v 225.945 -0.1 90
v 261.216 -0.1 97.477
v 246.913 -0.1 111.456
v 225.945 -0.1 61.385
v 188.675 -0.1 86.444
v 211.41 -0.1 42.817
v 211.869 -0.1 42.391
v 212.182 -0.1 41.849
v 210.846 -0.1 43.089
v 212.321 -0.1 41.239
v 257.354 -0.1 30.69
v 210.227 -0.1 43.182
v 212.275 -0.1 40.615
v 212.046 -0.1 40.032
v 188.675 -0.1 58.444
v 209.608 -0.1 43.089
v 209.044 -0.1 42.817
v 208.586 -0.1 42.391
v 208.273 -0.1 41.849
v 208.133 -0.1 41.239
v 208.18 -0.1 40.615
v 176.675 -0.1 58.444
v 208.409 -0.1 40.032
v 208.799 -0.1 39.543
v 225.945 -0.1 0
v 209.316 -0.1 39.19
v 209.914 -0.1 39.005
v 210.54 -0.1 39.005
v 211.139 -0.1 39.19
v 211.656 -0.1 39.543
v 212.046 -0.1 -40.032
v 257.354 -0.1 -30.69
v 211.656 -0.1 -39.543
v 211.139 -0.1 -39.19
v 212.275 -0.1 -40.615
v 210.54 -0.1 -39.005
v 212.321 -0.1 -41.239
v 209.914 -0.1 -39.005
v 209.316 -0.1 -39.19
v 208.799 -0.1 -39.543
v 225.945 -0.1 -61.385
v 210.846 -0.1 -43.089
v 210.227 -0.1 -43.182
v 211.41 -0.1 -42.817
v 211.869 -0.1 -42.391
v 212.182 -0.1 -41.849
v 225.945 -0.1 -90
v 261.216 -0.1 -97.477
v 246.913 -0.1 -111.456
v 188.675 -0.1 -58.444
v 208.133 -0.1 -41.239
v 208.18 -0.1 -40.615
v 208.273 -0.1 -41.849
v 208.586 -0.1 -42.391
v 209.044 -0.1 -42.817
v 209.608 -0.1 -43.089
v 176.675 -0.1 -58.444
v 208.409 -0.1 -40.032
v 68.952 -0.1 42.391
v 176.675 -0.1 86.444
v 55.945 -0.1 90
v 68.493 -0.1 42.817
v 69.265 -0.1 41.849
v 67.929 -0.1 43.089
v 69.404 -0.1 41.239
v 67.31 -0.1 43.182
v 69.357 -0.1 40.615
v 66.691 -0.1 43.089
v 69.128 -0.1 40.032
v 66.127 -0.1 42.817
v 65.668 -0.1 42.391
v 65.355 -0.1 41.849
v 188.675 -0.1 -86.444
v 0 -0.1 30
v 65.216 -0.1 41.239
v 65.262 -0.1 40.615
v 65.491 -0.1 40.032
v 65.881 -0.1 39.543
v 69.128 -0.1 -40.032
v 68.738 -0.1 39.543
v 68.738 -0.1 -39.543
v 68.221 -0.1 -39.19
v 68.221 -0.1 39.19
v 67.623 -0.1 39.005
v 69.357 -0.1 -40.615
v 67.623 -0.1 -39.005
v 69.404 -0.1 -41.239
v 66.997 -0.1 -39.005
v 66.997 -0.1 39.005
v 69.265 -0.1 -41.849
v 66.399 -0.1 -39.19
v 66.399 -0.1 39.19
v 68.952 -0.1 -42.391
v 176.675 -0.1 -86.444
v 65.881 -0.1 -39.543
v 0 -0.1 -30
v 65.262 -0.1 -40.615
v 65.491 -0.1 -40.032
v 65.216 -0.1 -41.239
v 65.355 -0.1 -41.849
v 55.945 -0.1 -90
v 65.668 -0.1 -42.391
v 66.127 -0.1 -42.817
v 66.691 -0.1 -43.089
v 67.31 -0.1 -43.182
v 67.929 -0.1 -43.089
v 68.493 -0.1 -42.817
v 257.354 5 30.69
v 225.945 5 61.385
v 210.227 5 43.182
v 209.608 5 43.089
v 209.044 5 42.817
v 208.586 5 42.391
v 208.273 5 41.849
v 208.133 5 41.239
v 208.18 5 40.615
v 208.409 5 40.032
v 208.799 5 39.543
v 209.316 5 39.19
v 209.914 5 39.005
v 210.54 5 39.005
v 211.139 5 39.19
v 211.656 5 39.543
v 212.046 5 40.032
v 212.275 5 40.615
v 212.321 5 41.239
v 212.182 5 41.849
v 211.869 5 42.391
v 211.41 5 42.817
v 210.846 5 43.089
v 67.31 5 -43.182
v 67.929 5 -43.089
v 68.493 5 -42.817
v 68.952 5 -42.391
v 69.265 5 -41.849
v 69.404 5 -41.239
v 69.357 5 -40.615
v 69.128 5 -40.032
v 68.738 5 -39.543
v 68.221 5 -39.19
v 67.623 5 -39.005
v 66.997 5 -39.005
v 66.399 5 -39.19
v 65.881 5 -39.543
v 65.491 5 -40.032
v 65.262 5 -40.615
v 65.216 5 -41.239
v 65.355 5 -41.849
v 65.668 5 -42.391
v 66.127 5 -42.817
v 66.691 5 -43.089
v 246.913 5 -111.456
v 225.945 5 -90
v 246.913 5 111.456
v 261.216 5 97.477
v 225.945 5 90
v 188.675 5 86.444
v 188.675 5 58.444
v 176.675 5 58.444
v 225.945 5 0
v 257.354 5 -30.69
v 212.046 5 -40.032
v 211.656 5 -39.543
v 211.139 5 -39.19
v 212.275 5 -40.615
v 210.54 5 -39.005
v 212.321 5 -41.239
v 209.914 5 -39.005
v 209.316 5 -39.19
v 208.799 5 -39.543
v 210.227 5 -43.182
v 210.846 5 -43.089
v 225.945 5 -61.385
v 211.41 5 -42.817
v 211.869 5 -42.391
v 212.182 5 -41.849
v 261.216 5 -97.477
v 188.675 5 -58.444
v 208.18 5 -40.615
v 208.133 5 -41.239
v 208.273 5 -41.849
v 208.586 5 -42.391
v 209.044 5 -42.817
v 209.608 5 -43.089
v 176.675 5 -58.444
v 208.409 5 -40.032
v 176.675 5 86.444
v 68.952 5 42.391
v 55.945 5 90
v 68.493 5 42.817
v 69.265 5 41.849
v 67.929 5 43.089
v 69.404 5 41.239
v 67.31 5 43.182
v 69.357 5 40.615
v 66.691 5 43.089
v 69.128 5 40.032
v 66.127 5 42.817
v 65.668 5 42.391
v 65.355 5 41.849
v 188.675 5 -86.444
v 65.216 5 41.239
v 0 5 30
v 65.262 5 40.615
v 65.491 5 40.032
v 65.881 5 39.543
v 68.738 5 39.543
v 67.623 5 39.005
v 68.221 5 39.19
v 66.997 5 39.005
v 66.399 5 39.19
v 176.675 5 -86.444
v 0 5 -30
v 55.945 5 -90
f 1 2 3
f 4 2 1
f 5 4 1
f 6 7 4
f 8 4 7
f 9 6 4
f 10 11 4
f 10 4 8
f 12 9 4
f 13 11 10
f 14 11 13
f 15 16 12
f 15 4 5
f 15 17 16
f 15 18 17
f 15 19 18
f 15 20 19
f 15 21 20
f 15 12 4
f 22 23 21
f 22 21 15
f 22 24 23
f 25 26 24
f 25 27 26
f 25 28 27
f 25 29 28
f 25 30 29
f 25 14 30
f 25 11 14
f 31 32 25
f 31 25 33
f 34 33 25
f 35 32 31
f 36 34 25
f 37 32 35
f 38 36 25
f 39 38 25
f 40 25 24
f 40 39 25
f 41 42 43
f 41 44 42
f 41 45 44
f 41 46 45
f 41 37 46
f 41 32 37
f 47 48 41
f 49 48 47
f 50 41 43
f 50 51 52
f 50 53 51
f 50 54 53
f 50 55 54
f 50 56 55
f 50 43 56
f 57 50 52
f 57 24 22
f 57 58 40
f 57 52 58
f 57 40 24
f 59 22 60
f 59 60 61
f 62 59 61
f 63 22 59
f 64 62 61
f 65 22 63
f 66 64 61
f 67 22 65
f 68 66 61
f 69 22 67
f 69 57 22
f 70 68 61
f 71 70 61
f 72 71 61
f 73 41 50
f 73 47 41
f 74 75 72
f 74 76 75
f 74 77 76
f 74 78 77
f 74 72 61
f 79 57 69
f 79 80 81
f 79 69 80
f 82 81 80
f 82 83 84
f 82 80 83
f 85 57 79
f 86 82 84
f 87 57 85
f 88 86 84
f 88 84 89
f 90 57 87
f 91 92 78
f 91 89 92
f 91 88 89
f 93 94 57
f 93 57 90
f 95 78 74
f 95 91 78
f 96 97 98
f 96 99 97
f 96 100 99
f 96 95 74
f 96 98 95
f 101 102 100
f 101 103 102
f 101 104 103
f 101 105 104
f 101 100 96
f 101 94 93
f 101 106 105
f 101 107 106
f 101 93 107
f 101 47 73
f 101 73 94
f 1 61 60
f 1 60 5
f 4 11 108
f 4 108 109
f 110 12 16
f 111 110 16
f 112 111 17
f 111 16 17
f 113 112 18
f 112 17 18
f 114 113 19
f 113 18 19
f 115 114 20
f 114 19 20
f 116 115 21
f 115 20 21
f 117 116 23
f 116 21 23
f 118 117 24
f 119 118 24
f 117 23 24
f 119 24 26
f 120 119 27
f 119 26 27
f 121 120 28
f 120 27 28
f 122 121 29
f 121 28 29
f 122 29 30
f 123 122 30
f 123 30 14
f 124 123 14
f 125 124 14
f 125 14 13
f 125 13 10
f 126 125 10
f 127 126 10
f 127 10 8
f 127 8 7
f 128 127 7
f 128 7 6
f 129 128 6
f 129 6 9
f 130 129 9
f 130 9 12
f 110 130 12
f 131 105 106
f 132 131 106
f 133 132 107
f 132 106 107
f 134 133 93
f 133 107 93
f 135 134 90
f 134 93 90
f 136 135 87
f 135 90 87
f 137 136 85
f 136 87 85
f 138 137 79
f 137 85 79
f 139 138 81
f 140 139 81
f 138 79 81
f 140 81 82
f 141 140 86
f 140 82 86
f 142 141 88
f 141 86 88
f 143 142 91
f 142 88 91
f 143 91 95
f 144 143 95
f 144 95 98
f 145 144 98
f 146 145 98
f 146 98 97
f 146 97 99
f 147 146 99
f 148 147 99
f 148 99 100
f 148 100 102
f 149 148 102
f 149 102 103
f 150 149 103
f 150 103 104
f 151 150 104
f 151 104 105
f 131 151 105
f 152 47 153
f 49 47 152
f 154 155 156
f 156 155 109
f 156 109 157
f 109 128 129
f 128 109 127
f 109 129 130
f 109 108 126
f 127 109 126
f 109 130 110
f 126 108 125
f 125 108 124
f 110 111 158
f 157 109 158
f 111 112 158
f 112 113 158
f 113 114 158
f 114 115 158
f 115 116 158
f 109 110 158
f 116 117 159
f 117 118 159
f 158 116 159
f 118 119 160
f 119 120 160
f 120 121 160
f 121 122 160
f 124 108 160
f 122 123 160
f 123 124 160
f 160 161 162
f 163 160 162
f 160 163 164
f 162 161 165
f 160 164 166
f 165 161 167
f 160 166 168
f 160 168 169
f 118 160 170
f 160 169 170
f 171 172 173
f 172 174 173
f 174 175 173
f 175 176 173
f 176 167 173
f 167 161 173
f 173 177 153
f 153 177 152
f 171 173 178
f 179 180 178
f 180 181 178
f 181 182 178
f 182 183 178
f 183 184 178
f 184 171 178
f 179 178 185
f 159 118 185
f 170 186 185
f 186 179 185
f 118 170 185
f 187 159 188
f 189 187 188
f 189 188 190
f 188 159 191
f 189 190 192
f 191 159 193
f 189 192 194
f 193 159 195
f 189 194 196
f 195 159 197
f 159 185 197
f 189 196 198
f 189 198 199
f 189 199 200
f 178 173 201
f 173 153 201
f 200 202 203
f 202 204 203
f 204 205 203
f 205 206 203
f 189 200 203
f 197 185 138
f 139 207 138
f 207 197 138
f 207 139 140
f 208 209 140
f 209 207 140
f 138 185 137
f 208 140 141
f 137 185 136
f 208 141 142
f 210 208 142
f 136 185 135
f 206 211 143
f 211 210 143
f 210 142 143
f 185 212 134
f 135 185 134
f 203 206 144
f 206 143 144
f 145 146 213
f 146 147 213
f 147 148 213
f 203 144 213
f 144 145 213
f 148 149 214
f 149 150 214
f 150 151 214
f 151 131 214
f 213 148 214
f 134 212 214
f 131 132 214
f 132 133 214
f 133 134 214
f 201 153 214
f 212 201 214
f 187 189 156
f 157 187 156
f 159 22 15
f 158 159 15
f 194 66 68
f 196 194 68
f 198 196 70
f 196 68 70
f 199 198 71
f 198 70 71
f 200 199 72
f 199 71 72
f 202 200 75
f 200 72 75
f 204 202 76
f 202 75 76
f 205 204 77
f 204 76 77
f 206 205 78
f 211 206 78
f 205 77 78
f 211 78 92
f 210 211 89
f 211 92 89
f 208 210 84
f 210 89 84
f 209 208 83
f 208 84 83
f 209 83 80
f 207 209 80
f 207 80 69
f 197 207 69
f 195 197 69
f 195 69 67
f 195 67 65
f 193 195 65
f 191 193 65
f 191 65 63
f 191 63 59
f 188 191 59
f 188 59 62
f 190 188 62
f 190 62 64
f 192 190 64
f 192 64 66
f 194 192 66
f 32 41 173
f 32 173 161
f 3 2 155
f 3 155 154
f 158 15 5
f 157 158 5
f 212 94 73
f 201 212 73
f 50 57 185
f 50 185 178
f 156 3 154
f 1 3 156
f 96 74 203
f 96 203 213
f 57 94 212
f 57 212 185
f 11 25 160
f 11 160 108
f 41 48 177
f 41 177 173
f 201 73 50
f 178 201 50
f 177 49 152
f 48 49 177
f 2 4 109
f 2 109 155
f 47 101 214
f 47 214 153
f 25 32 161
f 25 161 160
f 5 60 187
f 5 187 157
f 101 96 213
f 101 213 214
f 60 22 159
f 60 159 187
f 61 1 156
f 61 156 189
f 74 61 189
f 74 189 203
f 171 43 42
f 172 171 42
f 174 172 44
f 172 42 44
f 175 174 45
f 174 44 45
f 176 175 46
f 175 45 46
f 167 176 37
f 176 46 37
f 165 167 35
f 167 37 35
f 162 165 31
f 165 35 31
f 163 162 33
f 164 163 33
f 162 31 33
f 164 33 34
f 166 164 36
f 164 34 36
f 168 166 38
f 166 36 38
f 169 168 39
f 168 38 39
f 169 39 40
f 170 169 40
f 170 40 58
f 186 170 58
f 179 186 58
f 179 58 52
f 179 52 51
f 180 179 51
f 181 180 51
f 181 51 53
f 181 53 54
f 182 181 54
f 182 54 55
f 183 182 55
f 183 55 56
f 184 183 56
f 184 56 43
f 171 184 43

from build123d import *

# Parameters (mm, degrees)
BOSS_EXTRUDE2_DEPTH      = 5
BOSS_EXTRUDE2_DEPTH_BACK = 0.1
SKETCH6_R                = 2.1
CUT_EXTRUDE2_DEPTH       = 10
SKETCH2_W                = 12
SKETCH2_H                = 28
CUT_EXTRUDE3_DEPTH       = 10


with BuildPart() as part:
    # Sketch1 → Boss-Extrude2 (new, two sides: drawn at the far end of the back side and taken through both)
    with BuildSketch(Plane(origin=(0, 0, 0), x_dir=(1, 0, 0), z_dir=(0, 1, 0)).offset(-BOSS_EXTRUDE2_DEPTH_BACK)):
        Polygon((0, -30), (0, 30), (55.94480687, 90), (225.94480687, 90), (246.912660032, 111.45574827), (261.216492211, 97.477179495), (225.94480687, 61.384767177), (257.353801996, 30.69), (225.94480687, 0), (257.353801996, -30.69), (225.94480687, -61.384767177), (261.216492211, -97.477179495), (246.912660032, -111.45574827), (225.94480687, -90), (55.94480687, -90), align=None)
    extrude(amount=BOSS_EXTRUDE2_DEPTH + BOSS_EXTRUDE2_DEPTH_BACK)

    # Sketch6 → Cut-Extrude2 (cut)
    with BuildSketch(Plane(origin=(0, -0.1, 0), x_dir=(-1, 0, 0), z_dir=(0, -1, 0))):
        with Locations(Location((-67.309752753, 41.081967218, 0), (0, 0, 90))):
            Circle(SKETCH6_R)
        with Locations(Location((-210.227358504, 41.081967218, 0), (0, 0, 90))):
            Circle(SKETCH6_R)
        with Locations(Location((-210.227358504, -41.081967218, 0), (0, 0, 270))):
            Circle(SKETCH6_R)
        with Locations(Location((-67.309752753, -41.081967218, 0), (0, 0, 270))):
            Circle(SKETCH6_R)
    extrude(amount=-CUT_EXTRUDE2_DEPTH, mode=Mode.SUBTRACT)

    # Sketch2 → Cut-Extrude3 (cut)
    with BuildSketch(Plane.XZ.offset(0.1)):
        with Locations((182.674603171, -72.444256033)):
            Rectangle(SKETCH2_W, SKETCH2_H)
        with Locations((182.674603171, 72.444256033)):
            Rectangle(SKETCH2_W, SKETCH2_H)
    extrude(amount=-CUT_EXTRUDE3_DEPTH, mode=Mode.SUBTRACT)


solid = part.part
